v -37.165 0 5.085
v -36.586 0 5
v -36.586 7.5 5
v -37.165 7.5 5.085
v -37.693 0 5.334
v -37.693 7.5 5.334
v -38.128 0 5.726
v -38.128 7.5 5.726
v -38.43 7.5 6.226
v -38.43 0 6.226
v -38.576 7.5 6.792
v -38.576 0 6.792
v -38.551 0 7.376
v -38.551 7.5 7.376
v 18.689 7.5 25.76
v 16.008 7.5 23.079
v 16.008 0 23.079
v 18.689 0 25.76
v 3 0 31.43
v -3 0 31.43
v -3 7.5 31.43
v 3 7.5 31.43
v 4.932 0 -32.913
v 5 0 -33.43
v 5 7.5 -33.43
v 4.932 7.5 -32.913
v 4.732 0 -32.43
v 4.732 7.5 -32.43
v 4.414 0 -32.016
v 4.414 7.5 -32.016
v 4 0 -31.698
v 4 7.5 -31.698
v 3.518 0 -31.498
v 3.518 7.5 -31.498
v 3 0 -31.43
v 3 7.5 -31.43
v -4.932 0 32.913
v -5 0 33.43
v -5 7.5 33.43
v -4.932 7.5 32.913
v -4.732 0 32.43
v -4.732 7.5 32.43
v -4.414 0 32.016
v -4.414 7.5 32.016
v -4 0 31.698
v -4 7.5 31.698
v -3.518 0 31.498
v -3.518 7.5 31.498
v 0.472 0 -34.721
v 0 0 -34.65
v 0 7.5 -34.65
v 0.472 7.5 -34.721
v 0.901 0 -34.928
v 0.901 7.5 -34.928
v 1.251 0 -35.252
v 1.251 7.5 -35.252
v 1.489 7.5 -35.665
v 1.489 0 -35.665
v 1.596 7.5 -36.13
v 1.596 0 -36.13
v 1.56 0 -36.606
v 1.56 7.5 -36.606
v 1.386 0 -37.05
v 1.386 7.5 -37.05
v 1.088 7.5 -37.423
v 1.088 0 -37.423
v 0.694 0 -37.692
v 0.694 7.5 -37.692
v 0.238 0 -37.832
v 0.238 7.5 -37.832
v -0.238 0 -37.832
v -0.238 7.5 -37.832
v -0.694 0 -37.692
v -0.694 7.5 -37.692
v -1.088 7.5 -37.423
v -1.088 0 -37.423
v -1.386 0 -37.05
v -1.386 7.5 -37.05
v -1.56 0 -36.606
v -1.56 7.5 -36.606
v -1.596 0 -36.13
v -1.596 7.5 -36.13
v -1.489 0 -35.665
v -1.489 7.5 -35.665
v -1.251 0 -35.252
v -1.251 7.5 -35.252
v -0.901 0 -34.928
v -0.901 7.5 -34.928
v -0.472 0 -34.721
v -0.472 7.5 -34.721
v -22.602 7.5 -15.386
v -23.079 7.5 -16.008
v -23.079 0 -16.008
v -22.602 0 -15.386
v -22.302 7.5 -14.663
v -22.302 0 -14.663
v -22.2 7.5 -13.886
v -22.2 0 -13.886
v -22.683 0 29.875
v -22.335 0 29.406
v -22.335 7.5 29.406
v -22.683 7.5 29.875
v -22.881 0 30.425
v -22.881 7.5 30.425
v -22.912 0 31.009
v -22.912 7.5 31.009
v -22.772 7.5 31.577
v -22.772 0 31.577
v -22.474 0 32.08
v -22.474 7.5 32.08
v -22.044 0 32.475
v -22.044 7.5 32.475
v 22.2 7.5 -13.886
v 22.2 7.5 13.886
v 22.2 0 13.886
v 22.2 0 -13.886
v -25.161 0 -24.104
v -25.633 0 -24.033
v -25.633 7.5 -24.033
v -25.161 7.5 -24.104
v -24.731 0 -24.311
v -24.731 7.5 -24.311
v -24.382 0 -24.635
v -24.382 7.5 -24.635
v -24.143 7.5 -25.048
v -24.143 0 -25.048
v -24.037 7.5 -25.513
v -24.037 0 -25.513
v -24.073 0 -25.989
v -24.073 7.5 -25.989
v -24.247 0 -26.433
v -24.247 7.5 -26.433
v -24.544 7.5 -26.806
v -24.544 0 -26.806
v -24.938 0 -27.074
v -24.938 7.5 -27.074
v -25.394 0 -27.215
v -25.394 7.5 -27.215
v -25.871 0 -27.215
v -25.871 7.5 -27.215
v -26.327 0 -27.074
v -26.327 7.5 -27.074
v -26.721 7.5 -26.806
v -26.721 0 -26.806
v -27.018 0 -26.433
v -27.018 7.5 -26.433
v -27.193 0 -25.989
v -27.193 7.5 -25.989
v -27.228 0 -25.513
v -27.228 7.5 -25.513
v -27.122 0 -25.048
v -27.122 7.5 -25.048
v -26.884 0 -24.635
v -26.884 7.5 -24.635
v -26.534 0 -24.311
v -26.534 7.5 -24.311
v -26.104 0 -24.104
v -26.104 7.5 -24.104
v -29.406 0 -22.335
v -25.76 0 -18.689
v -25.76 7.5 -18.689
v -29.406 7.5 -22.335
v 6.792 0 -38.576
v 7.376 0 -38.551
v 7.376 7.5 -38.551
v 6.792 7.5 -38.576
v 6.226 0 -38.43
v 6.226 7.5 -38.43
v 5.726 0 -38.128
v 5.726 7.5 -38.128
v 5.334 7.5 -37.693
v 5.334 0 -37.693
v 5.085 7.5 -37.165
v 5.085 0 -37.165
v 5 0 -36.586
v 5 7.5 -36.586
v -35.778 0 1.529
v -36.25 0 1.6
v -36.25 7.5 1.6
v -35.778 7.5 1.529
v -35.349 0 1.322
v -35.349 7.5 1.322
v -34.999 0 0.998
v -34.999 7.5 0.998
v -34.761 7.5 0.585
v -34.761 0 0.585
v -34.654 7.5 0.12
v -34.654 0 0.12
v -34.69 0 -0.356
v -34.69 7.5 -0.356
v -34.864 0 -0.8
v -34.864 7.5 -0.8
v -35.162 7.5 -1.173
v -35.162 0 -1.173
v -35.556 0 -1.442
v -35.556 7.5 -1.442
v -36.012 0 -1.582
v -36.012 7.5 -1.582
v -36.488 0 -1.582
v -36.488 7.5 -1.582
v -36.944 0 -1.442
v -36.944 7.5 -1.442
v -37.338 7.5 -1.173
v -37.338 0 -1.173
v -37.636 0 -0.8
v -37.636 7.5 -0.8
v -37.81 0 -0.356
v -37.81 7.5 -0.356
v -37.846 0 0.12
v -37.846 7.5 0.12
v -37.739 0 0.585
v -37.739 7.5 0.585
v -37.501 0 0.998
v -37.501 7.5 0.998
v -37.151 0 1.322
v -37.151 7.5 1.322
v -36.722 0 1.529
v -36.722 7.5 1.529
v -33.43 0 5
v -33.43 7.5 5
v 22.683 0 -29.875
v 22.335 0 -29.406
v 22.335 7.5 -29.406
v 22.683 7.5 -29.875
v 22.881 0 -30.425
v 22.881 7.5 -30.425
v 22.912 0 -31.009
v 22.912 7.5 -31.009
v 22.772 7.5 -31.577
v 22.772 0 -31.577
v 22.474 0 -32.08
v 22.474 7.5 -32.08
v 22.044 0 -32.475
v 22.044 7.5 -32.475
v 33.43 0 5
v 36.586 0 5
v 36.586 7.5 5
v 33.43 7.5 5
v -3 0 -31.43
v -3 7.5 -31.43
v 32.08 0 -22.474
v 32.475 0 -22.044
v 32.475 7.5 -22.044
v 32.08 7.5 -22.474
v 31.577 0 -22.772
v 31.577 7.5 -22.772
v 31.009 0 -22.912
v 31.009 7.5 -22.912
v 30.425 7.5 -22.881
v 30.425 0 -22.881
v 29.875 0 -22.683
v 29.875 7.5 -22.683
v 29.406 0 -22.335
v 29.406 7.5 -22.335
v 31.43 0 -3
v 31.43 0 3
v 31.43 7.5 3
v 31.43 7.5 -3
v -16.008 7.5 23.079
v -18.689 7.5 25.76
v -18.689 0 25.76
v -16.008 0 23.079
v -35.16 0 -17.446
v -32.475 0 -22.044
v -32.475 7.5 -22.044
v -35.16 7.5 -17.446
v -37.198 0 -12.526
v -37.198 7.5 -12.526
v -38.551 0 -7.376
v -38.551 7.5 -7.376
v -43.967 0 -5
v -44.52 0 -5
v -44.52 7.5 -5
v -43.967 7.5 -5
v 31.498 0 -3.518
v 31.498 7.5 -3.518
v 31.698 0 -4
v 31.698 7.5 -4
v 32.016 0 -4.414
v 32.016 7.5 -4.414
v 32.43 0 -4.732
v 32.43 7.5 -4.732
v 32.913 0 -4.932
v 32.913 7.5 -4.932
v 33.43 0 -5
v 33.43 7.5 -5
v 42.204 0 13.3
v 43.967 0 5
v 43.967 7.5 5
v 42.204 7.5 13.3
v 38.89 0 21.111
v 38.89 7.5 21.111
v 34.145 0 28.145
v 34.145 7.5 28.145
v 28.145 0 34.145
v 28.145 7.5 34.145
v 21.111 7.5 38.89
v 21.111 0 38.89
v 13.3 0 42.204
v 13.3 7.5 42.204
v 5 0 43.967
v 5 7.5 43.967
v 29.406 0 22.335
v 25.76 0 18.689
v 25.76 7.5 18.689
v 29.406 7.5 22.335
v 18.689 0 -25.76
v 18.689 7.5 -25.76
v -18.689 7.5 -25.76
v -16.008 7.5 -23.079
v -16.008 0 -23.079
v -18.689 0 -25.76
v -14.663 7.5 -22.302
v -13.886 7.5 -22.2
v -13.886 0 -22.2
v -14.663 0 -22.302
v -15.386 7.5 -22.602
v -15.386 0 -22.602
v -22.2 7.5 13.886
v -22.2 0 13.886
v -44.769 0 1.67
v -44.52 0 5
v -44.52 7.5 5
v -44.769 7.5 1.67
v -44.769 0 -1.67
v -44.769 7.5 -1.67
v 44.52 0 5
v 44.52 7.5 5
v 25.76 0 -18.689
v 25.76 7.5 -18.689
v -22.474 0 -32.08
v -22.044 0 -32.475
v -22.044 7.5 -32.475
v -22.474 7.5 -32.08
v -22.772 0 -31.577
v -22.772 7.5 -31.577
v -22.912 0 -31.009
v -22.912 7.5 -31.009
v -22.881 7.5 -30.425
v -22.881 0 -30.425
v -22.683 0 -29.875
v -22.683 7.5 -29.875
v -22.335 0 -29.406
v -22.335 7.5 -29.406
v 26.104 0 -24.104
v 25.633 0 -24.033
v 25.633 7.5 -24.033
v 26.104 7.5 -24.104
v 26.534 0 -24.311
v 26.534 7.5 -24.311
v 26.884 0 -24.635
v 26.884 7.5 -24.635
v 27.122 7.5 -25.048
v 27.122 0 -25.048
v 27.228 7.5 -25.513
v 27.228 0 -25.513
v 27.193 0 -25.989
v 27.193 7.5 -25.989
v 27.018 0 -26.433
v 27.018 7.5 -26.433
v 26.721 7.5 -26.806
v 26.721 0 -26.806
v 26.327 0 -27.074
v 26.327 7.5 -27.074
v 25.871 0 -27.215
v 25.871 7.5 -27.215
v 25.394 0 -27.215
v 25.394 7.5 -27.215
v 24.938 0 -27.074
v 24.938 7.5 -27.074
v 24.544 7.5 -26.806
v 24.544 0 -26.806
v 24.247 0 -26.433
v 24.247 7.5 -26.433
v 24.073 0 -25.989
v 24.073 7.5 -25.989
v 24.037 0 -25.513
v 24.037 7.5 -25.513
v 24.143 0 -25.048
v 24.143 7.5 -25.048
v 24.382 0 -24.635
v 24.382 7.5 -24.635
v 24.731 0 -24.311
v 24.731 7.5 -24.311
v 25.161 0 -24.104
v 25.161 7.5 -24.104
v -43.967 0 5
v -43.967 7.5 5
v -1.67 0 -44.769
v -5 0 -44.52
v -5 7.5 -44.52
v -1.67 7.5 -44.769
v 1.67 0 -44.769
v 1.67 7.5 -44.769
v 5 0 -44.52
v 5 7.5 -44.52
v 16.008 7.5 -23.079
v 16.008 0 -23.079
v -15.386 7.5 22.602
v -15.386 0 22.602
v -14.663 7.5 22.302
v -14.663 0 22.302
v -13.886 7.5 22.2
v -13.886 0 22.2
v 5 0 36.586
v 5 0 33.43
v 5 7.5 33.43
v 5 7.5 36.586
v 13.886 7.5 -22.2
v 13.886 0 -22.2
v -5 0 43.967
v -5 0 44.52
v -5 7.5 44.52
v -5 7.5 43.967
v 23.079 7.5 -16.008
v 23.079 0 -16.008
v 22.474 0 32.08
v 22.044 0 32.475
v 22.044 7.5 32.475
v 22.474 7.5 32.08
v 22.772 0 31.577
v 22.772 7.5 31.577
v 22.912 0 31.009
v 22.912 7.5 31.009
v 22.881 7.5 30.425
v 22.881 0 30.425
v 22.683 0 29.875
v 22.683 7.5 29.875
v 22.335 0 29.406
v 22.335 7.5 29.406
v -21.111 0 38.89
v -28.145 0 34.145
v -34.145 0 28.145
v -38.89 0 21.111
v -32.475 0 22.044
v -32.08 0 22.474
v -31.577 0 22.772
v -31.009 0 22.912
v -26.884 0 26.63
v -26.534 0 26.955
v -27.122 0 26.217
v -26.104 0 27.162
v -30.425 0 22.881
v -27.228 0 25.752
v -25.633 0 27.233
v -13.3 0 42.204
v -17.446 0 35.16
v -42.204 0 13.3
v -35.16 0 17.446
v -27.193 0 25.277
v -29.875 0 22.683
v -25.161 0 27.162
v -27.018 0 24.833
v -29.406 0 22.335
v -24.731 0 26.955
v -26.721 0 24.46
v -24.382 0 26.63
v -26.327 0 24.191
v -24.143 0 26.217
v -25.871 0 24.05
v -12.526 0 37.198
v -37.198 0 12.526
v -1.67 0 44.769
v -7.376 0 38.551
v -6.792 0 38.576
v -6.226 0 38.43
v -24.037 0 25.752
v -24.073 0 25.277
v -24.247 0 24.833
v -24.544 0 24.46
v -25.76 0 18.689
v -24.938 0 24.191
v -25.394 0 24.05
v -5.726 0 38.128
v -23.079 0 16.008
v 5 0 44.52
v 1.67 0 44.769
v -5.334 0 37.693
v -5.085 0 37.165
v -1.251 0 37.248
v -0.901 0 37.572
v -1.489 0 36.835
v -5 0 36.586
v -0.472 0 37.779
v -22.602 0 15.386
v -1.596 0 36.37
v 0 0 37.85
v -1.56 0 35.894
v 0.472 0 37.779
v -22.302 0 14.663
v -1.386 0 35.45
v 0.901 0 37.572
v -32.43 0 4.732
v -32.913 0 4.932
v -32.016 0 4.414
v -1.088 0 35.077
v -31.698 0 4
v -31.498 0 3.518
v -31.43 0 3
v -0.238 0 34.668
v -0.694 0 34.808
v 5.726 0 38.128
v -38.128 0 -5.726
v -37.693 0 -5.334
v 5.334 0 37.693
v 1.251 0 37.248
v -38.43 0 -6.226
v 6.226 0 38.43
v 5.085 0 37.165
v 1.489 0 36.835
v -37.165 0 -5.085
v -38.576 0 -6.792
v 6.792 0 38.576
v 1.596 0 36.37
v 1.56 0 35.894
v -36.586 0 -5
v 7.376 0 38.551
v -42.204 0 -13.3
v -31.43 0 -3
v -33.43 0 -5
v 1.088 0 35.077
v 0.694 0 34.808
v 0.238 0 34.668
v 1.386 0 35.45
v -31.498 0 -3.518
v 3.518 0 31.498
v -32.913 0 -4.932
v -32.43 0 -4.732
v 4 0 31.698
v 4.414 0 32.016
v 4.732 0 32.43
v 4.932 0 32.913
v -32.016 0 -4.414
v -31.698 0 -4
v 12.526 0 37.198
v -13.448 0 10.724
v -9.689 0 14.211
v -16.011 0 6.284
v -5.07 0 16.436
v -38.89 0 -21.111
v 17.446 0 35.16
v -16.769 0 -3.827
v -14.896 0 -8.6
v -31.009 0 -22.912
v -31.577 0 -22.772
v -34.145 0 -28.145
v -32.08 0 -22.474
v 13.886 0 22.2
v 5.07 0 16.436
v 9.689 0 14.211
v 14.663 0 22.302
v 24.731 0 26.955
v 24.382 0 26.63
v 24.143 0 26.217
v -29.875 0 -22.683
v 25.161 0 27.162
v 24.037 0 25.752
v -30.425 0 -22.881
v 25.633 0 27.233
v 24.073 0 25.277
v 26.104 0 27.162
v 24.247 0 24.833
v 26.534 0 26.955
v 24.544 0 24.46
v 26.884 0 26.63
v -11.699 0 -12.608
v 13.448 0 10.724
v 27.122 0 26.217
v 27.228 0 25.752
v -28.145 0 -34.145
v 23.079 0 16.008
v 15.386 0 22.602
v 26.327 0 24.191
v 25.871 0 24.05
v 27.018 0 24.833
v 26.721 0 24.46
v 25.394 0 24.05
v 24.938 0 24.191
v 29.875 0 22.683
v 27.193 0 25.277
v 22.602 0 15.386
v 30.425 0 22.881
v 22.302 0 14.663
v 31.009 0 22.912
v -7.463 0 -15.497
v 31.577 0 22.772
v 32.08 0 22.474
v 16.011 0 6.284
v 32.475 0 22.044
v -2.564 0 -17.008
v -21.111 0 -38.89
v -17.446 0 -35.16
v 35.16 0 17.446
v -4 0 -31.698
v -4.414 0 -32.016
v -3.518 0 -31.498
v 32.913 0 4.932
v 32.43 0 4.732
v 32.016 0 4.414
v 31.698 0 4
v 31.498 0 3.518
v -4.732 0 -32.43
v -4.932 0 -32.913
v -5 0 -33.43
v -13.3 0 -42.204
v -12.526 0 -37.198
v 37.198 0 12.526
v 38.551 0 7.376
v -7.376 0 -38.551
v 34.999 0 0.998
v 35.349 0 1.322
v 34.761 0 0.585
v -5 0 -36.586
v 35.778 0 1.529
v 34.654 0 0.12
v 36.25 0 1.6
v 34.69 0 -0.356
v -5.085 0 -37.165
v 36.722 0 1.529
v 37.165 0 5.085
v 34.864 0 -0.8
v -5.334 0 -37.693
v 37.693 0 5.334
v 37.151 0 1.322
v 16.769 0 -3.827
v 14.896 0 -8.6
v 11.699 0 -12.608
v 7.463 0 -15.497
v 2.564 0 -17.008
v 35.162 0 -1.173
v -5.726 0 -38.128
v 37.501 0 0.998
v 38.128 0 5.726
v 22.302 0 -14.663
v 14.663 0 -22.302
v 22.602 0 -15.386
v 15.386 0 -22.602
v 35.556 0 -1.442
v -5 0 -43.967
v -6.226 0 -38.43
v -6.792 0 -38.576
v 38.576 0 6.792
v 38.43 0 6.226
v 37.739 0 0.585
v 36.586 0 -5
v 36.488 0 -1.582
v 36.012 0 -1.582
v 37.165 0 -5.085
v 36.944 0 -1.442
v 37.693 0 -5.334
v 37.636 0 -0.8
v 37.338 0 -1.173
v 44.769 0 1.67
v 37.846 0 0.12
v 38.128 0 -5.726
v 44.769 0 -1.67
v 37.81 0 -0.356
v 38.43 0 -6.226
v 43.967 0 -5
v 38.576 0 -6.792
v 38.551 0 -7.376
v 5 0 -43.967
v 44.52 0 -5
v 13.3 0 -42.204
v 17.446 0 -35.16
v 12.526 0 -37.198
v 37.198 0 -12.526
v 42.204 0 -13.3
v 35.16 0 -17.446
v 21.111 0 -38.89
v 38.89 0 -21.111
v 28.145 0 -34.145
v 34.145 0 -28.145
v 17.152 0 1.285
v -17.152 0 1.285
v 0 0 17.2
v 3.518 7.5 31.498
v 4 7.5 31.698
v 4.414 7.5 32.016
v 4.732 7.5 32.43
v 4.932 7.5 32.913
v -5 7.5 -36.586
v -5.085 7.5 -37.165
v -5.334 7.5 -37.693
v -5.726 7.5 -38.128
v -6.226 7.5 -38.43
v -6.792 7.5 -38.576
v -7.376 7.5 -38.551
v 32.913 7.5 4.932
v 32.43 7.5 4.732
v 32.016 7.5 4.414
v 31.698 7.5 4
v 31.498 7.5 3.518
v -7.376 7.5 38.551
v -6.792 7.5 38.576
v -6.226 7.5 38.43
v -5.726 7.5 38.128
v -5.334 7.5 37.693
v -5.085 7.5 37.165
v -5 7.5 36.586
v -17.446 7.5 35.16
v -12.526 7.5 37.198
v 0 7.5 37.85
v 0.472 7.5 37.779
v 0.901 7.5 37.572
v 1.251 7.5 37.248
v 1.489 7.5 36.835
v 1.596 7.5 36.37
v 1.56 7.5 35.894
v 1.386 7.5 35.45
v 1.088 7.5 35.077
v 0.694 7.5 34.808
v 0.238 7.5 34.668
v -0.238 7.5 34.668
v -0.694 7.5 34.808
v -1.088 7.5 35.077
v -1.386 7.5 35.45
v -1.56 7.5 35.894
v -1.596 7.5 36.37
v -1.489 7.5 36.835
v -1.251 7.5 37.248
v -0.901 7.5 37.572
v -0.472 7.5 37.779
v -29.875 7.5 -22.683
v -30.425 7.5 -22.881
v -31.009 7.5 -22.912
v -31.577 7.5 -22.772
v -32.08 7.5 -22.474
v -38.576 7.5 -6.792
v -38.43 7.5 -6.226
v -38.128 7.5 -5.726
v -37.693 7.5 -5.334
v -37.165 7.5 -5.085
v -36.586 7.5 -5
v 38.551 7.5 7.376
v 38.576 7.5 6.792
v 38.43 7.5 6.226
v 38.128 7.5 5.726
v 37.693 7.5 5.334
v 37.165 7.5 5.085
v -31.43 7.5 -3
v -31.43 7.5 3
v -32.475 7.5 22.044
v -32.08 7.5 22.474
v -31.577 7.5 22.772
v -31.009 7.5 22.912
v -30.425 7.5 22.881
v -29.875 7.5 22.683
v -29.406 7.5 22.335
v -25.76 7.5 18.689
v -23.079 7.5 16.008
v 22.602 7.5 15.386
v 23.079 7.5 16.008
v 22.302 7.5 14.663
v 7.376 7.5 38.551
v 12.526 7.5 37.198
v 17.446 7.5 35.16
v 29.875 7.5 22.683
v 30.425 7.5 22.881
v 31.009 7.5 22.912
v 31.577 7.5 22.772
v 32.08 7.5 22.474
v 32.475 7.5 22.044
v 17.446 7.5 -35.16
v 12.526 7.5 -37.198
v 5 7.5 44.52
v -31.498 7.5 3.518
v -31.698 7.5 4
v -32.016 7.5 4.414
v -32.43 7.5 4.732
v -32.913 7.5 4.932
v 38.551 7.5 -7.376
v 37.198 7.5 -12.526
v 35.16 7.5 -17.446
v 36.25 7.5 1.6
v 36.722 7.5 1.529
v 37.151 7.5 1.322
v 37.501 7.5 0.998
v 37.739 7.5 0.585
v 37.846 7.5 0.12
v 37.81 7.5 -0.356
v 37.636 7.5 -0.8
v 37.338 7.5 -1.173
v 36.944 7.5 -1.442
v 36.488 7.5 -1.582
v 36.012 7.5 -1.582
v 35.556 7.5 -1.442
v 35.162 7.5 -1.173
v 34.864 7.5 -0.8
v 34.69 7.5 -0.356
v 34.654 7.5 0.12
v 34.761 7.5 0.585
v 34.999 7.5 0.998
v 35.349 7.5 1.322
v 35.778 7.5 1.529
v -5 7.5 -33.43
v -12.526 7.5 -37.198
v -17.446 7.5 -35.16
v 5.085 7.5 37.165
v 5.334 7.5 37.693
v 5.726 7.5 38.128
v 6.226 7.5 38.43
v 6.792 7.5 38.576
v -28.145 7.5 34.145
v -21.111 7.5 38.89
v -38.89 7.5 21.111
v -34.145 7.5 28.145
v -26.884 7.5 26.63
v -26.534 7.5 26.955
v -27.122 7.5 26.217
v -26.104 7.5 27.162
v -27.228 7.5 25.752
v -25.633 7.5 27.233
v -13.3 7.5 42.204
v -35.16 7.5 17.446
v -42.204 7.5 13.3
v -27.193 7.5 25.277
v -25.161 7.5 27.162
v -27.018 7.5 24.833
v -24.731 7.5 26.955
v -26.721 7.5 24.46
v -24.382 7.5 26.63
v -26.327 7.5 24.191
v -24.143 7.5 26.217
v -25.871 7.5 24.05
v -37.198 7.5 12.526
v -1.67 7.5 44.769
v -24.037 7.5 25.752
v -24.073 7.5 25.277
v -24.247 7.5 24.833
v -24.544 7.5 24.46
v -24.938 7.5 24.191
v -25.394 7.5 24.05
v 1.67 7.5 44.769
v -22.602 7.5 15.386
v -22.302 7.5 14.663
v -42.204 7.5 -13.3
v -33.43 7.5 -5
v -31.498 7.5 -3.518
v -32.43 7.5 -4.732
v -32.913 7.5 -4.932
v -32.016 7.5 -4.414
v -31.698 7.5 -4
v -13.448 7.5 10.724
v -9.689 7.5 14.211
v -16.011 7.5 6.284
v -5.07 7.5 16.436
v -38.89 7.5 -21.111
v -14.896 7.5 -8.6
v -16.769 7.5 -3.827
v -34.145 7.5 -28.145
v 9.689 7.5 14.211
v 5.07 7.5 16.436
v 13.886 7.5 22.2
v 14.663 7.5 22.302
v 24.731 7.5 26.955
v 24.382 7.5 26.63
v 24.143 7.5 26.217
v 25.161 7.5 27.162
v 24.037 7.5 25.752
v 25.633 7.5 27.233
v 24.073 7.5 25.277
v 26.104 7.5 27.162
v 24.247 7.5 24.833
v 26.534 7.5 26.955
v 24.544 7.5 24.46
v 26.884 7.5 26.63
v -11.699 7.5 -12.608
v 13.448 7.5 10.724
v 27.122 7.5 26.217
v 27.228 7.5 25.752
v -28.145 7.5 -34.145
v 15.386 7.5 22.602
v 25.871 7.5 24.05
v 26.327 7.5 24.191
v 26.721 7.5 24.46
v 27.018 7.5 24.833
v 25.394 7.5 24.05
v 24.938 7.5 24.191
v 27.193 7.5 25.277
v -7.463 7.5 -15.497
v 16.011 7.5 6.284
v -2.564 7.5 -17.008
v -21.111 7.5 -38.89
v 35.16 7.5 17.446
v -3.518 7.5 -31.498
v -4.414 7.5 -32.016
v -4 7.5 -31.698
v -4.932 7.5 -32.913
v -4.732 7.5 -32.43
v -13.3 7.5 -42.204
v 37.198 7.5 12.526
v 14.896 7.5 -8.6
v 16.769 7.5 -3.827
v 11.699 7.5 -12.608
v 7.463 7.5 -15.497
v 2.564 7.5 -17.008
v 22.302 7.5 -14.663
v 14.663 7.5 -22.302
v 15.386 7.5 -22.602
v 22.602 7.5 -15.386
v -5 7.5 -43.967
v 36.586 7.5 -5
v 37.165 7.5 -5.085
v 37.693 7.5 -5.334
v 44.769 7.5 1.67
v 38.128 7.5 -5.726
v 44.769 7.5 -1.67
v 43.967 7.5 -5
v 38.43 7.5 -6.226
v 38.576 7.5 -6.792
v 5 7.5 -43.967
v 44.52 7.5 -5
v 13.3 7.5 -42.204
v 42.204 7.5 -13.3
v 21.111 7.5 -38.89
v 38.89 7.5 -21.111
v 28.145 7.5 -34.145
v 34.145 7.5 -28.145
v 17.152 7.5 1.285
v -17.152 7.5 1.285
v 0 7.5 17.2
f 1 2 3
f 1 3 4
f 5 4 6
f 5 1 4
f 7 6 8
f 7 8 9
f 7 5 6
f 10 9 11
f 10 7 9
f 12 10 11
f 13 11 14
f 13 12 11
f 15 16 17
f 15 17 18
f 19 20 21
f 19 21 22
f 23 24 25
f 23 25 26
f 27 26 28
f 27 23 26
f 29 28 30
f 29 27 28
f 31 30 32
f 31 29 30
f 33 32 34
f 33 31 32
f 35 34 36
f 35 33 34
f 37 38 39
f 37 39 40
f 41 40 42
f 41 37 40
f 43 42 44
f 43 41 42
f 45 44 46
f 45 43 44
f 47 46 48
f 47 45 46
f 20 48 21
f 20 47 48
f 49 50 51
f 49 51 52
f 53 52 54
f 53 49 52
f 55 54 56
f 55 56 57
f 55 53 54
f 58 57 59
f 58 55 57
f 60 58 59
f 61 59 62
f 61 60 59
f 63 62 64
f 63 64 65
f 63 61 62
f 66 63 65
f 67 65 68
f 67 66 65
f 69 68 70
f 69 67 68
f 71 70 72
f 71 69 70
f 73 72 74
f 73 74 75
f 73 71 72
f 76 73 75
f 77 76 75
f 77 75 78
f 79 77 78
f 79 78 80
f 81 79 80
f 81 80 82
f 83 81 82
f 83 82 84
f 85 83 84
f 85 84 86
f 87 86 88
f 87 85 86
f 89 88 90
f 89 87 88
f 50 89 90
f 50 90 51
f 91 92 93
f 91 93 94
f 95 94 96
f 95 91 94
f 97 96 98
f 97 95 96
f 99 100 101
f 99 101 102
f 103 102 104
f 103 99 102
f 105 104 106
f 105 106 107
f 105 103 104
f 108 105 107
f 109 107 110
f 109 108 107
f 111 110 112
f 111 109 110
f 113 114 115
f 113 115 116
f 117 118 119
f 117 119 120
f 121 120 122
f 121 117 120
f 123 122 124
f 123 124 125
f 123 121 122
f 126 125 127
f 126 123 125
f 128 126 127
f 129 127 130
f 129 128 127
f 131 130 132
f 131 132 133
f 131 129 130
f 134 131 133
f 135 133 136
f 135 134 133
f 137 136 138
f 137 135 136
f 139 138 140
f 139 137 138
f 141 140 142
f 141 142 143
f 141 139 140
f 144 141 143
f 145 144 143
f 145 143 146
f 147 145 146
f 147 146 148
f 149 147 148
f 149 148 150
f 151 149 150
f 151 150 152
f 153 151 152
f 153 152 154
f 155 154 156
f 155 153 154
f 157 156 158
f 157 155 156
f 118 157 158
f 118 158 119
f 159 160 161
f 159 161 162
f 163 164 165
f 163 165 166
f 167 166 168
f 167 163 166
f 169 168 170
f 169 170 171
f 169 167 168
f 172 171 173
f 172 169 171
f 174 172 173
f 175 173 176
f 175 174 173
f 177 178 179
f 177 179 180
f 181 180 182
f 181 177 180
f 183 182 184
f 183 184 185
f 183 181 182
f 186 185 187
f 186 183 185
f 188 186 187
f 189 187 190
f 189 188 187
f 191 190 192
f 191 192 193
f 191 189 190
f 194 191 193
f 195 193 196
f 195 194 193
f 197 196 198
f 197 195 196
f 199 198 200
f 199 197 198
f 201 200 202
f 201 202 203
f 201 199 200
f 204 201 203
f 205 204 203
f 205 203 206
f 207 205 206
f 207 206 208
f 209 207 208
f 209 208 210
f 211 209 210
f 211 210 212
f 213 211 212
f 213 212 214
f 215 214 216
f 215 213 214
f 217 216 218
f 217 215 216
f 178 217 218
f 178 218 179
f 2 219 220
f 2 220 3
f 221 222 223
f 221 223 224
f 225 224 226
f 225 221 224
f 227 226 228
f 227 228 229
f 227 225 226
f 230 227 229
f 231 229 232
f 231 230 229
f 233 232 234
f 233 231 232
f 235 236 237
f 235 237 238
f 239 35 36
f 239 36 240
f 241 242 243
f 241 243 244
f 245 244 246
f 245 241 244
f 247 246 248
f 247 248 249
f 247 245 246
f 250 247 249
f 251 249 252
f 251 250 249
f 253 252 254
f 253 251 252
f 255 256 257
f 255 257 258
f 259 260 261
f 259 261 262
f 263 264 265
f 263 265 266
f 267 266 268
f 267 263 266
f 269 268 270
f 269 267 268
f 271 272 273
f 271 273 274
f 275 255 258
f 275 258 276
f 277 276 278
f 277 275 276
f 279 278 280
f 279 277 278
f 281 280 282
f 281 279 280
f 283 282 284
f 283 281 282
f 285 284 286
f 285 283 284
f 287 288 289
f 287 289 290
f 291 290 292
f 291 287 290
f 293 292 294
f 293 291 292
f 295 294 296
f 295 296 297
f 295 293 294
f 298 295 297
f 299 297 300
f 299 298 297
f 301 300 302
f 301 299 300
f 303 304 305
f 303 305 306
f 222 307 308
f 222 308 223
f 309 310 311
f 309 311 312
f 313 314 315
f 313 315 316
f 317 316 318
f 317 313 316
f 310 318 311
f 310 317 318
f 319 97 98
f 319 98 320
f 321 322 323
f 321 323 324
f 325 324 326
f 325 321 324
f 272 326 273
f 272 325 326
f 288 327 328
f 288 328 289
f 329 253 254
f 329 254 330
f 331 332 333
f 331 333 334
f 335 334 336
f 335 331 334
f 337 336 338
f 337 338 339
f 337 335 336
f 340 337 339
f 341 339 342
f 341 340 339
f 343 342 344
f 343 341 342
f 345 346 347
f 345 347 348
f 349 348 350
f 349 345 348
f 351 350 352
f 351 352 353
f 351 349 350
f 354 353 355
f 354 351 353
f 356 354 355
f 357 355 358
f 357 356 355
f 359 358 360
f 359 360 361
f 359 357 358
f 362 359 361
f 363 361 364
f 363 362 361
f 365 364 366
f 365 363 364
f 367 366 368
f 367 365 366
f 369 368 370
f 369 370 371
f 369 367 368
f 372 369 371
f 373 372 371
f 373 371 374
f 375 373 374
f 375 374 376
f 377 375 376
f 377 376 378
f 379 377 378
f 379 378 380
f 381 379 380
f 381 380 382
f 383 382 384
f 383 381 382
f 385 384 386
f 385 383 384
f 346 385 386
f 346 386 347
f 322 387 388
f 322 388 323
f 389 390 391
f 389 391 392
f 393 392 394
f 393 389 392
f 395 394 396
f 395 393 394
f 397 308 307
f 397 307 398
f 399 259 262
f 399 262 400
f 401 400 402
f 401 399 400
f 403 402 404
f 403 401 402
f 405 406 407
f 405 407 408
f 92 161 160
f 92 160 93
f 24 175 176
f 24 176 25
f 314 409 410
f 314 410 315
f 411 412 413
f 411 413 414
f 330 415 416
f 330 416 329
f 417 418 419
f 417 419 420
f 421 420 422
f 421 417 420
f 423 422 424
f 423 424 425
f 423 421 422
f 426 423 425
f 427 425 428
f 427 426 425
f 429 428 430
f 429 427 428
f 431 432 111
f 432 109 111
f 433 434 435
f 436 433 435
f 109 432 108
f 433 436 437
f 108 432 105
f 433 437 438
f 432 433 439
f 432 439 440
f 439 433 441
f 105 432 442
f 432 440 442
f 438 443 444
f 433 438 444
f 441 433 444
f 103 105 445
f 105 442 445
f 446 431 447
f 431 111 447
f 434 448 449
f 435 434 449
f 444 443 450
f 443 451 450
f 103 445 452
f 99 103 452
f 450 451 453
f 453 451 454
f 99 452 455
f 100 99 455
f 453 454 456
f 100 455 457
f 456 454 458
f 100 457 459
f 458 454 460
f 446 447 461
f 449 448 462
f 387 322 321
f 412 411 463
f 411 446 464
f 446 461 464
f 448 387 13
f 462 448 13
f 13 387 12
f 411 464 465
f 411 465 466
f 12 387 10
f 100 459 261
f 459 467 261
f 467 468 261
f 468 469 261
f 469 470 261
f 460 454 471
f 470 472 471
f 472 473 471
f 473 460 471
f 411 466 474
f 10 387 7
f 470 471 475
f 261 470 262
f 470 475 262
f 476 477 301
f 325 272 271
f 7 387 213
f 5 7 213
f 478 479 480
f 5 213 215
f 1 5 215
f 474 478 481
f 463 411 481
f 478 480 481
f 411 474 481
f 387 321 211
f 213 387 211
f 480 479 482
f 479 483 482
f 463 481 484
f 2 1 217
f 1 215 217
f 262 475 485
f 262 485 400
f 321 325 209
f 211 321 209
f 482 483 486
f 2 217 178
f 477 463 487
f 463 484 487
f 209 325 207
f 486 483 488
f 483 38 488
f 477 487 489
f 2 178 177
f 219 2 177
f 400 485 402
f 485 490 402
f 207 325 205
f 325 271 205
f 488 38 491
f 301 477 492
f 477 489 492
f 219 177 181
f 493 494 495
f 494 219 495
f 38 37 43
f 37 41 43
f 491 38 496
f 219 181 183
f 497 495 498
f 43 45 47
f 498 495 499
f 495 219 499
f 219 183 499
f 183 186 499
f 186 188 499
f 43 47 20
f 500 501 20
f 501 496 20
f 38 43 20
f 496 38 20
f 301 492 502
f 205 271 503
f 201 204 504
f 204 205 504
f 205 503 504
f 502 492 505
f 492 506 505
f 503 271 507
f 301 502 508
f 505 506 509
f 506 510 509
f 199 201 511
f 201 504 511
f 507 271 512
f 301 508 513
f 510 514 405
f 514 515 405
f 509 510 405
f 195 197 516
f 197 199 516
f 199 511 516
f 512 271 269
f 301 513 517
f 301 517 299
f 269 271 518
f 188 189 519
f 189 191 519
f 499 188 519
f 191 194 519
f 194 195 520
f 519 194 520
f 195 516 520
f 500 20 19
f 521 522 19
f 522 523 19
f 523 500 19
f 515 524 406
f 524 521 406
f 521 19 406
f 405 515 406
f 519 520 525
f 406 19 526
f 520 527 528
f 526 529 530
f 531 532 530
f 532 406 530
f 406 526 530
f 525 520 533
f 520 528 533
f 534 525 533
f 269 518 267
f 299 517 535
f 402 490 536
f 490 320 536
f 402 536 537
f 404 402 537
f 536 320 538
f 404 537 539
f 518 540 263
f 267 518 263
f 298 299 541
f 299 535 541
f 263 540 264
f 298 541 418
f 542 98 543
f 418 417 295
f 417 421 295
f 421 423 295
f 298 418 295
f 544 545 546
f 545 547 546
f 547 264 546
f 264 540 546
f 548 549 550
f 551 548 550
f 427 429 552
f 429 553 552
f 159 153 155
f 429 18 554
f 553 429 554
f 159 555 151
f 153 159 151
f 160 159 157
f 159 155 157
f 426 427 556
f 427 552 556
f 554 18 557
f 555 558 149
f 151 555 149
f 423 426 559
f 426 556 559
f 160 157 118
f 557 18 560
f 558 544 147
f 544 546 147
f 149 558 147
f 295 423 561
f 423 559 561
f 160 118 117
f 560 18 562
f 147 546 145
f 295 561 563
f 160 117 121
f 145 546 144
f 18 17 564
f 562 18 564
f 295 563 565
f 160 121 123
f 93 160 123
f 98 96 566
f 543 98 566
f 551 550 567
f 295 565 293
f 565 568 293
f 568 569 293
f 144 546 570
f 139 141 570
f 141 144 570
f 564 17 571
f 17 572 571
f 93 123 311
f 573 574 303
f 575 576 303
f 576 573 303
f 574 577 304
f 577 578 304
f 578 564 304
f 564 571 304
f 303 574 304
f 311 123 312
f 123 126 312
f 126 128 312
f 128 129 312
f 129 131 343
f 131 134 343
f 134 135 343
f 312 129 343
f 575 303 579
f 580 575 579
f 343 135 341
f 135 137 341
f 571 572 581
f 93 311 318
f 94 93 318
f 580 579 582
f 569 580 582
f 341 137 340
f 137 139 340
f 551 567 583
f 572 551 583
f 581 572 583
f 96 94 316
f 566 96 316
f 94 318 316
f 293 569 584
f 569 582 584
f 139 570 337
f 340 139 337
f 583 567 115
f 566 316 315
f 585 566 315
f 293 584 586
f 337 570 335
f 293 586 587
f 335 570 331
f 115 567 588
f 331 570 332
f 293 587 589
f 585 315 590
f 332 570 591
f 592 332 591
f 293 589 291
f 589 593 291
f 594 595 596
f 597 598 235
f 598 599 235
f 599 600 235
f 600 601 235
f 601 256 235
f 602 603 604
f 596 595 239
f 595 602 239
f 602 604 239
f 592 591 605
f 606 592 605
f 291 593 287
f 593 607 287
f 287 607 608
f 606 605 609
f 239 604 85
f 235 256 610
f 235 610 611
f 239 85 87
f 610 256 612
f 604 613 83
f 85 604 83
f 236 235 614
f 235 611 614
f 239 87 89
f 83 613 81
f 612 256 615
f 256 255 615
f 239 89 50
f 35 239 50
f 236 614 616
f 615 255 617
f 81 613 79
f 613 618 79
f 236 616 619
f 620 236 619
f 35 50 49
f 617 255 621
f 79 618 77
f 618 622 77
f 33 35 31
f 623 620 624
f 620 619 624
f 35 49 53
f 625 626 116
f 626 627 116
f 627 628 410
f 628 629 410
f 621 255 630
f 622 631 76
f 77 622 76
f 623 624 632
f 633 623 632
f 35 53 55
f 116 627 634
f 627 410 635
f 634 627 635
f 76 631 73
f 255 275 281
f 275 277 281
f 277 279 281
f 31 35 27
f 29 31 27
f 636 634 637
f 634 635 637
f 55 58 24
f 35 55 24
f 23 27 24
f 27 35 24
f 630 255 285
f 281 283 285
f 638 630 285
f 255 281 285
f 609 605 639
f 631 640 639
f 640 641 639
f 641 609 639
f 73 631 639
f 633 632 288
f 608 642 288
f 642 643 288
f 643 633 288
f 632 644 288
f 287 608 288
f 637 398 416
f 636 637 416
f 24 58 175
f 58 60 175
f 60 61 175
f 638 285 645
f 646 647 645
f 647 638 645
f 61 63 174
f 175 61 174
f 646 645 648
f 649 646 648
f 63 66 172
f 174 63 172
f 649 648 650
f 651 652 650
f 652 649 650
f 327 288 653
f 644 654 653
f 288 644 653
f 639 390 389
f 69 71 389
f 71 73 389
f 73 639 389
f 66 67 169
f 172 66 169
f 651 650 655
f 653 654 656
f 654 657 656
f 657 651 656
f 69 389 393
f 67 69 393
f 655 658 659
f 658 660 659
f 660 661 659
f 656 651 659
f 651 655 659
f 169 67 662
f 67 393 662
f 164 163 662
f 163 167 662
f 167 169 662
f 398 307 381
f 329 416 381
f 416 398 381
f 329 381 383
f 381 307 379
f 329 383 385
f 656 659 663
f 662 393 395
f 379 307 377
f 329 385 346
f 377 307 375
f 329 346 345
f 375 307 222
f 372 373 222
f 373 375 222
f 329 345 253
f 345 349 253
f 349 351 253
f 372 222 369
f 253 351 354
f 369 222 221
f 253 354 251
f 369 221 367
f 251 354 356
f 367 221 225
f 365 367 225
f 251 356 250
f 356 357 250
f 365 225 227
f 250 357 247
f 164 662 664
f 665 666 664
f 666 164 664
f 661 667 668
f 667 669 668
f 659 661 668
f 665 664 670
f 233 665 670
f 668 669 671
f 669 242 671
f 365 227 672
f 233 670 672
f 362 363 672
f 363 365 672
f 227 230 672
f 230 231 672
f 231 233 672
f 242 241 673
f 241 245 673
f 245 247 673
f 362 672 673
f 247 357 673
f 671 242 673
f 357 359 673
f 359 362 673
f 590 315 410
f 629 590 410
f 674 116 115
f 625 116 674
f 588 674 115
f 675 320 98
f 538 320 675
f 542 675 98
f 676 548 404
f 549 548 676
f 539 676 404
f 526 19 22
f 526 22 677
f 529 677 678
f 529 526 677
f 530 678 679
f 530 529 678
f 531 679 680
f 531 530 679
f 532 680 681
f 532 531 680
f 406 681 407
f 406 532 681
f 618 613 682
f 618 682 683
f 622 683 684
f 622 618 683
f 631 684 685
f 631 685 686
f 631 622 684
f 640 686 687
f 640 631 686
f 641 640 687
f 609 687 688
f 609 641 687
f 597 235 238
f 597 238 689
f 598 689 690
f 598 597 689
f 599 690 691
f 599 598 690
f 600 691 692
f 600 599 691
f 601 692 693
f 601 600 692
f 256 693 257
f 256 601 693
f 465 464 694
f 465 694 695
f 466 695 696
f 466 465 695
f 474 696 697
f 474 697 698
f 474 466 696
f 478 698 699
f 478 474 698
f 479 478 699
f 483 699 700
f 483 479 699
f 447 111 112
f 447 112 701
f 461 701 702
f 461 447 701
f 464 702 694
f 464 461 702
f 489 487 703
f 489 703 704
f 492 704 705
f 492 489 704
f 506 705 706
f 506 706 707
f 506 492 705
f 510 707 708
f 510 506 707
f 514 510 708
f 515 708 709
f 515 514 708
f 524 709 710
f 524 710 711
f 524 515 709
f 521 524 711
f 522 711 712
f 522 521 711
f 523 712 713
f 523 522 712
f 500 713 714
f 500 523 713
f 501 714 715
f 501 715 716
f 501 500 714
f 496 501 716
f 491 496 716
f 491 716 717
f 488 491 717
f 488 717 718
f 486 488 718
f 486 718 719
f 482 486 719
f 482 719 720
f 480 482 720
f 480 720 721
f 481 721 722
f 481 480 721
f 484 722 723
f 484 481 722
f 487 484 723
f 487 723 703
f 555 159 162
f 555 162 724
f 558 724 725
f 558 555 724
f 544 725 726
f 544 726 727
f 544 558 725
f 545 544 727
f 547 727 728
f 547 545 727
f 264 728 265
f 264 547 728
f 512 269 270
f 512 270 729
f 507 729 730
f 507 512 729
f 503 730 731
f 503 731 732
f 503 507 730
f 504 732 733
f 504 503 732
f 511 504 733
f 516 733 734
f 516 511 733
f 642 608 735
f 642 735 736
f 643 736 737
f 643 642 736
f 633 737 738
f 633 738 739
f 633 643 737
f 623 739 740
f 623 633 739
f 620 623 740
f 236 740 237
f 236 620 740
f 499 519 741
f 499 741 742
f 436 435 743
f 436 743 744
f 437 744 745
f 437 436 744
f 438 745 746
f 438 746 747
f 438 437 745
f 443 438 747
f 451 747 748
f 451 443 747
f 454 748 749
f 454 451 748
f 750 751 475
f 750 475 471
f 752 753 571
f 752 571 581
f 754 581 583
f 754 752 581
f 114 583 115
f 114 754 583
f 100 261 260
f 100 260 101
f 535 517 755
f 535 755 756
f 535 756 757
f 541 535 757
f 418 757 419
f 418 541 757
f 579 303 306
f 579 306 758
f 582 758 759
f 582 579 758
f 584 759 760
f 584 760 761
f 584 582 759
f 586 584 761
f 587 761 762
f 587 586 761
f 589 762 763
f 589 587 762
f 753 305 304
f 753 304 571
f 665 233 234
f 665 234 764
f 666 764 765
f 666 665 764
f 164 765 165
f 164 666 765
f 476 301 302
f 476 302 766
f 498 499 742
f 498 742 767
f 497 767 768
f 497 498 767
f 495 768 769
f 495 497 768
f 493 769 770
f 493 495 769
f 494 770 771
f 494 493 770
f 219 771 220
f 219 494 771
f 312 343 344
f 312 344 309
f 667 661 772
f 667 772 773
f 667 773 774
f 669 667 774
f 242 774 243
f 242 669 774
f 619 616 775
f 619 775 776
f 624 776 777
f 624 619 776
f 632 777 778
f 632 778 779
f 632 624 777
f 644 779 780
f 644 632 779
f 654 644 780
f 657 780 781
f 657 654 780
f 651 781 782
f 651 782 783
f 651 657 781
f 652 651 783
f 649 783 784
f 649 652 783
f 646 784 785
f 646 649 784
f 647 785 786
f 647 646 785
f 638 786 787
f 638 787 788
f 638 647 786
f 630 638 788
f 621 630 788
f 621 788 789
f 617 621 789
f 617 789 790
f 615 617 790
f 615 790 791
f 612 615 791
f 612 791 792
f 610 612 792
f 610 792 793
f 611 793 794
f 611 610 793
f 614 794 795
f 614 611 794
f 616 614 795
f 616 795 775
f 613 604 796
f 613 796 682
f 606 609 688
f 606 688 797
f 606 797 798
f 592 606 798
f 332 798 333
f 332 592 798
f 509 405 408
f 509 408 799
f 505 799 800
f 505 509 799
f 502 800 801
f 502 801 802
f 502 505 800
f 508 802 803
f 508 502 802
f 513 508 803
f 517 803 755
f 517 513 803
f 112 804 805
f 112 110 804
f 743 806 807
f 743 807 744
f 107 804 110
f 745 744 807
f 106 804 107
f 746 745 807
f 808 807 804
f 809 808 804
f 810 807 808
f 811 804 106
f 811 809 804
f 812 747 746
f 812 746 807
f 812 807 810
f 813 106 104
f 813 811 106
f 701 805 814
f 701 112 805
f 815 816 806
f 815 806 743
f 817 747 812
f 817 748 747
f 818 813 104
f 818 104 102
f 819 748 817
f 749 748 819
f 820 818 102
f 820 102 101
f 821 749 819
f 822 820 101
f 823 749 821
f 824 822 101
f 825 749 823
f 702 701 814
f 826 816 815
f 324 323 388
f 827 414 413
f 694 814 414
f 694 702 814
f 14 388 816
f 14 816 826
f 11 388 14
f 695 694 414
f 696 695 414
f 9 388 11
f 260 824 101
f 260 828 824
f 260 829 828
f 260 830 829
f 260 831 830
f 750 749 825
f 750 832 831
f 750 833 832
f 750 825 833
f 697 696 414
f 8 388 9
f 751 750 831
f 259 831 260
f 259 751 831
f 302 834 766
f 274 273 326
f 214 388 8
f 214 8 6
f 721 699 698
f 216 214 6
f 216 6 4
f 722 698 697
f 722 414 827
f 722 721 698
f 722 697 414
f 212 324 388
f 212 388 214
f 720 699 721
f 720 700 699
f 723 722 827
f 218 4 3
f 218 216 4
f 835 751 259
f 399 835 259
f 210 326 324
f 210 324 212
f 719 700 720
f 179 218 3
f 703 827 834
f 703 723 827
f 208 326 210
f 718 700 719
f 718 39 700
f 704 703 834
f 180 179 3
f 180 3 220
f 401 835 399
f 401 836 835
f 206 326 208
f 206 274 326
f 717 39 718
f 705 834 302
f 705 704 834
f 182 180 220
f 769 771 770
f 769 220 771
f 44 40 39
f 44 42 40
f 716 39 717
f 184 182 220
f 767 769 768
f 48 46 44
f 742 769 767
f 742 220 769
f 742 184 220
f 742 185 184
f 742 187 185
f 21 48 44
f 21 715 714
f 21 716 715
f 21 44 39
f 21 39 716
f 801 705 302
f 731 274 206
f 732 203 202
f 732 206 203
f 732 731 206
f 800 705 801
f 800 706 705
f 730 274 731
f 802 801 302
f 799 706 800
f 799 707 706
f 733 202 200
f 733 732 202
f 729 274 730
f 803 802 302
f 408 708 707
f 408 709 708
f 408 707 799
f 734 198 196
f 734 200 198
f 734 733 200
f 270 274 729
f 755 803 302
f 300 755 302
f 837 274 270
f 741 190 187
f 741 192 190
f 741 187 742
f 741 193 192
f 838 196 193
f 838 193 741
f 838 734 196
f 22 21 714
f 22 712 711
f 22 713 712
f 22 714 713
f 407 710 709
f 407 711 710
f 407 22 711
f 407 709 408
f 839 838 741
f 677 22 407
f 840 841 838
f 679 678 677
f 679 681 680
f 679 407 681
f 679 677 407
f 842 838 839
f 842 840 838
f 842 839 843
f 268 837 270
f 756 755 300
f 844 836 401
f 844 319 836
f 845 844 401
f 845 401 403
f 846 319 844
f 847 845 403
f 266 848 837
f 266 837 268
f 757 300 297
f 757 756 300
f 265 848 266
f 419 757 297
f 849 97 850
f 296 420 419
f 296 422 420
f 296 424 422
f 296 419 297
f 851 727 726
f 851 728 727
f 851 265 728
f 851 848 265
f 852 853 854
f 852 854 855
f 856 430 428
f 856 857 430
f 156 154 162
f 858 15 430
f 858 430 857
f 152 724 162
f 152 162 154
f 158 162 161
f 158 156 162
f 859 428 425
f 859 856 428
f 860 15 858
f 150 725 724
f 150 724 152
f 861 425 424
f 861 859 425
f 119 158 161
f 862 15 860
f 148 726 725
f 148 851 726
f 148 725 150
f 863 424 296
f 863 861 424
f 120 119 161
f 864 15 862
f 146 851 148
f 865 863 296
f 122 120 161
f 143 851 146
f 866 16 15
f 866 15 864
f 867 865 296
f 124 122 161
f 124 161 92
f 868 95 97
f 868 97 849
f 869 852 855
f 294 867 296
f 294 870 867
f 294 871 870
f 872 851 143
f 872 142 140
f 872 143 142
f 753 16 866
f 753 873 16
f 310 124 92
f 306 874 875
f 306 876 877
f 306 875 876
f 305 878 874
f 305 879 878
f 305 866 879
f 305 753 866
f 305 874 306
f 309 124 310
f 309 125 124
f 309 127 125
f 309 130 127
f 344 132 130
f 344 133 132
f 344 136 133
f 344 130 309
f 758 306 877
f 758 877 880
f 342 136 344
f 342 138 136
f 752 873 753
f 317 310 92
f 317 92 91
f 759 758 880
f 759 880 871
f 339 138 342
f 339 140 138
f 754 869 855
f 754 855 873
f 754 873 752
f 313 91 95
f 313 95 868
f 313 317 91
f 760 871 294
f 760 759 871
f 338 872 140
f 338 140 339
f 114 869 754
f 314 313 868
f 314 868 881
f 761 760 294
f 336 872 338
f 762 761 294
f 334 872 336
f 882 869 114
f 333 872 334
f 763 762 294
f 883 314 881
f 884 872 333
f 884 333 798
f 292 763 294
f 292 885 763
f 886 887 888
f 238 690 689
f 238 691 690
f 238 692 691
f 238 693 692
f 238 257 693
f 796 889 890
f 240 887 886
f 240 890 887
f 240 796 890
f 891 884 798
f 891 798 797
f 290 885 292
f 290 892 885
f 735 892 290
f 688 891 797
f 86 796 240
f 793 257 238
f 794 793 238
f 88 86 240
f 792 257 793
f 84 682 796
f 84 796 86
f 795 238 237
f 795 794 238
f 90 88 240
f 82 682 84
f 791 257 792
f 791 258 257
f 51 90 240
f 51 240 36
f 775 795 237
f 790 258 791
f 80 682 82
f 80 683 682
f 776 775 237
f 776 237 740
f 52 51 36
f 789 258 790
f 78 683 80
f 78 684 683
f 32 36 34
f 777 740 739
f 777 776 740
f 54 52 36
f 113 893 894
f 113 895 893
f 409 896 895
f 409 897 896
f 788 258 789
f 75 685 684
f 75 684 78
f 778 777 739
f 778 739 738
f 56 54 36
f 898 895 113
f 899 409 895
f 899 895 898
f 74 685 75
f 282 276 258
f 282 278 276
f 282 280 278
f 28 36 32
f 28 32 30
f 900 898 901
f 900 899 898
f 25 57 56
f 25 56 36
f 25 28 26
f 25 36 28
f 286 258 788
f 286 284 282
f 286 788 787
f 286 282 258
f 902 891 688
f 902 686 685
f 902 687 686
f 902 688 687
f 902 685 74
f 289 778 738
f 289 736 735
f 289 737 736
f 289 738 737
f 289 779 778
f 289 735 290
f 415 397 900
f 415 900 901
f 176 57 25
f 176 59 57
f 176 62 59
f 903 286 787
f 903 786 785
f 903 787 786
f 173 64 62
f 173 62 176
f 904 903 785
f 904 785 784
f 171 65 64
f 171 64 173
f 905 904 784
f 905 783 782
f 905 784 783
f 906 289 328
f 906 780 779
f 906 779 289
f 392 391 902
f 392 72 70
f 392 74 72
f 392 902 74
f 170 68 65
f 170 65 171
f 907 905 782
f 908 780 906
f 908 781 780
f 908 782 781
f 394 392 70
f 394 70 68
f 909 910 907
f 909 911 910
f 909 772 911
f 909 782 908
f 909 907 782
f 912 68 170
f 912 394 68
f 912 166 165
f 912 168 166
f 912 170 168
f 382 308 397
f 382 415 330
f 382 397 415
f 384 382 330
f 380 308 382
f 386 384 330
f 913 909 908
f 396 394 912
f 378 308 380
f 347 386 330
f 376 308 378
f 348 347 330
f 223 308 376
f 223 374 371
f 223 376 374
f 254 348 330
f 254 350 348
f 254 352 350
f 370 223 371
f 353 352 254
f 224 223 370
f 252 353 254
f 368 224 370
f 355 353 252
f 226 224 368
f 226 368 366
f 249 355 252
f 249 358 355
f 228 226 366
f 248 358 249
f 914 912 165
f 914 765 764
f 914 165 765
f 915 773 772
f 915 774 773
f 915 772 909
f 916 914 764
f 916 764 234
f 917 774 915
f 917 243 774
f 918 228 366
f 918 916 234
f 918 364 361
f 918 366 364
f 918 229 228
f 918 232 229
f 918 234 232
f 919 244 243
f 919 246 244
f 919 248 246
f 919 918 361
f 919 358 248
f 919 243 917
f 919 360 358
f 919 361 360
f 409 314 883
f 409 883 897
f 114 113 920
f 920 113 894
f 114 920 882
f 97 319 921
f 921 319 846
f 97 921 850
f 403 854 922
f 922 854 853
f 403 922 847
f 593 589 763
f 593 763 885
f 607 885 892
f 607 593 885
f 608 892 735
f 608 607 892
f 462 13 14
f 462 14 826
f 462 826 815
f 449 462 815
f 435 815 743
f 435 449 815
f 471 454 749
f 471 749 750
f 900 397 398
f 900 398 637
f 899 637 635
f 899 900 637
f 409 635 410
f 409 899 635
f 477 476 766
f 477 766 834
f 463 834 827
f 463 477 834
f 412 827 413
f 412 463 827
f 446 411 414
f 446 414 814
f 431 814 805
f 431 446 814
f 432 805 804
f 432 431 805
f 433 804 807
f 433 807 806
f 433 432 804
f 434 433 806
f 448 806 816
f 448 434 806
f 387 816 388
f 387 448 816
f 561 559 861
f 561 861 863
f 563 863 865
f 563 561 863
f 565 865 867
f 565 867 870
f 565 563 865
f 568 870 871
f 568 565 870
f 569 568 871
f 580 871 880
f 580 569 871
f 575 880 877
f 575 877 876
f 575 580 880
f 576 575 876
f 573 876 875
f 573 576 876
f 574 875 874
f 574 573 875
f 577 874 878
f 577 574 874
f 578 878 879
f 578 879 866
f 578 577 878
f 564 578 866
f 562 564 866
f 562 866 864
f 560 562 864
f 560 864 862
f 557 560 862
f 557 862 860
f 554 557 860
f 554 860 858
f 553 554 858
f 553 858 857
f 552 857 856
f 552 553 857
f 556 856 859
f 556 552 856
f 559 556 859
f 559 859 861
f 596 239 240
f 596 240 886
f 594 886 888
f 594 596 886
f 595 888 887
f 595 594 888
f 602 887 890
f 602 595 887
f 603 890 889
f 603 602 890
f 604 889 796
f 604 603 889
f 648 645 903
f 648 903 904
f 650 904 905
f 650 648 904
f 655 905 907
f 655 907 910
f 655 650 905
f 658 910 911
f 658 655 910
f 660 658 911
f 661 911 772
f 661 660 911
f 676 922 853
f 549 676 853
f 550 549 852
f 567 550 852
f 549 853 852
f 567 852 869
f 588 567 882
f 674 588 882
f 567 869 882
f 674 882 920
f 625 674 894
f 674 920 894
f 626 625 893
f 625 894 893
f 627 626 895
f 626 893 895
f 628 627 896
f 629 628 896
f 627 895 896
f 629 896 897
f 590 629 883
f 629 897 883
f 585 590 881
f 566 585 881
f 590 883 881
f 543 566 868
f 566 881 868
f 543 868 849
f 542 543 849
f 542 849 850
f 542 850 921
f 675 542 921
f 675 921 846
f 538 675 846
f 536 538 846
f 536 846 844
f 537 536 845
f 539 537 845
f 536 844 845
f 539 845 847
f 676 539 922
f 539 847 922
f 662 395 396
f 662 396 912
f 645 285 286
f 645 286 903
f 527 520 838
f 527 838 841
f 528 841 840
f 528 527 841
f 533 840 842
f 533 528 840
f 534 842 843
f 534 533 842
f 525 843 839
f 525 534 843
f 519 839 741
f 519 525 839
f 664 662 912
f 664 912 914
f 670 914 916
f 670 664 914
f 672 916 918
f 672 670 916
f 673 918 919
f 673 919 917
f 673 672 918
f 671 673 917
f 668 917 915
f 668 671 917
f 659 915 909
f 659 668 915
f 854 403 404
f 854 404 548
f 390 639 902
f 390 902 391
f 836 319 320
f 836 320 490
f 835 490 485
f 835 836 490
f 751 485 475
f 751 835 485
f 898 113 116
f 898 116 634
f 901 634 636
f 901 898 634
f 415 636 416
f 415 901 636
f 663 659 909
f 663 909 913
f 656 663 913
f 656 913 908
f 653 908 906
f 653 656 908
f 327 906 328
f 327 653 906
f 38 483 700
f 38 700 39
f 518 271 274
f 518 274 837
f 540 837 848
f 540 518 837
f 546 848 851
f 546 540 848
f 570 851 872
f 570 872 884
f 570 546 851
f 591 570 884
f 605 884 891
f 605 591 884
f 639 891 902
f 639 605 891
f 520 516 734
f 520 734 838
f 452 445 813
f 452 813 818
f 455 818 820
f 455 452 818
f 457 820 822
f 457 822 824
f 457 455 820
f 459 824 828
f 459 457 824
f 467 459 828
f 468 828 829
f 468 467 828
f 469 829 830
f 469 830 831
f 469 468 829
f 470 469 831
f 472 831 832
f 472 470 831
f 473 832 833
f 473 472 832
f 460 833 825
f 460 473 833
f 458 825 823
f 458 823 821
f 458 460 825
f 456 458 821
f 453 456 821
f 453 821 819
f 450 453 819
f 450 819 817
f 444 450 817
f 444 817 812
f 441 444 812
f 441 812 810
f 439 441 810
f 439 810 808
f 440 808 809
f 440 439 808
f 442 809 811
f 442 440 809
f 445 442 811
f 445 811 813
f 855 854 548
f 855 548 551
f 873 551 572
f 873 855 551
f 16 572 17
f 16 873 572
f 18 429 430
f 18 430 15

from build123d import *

# Parameters (mm, degrees)
SKETCH1_R           = 1.6
BOSS_EXTRUDE1_DEPTH = 7.5
SKETCH2_R           = 17.2
BOSS_EXTRUDE2_DEPTH = 7.5


with BuildPart() as part:
    # Sketch1 → Boss-Extrude1 (new body)
    with BuildSketch(Plane(origin=(0, 0, 0), x_dir=(1, 0, 0), z_dir=(0, 1, 0))):
        with BuildLine():
            Line((-5, 43.966606646), (-5, 44.520107817))
            ThreePointArc((-5, 44.520107817), (0, 44.8), (5, 44.520107817))
            Line((5, 44.520107817), (5, 43.966606646))
            ThreePointArc((5, 43.966606646), (31.289475068, 31.289475068), (43.966606646, 5))
            Line((43.966606646, 5), (44.520107817, 5))
            ThreePointArc((44.520107817, 5), (44.8, 0), (44.520107817, -5))
            Line((44.520107817, -5), (43.966606646, -5))
            ThreePointArc((43.966606646, -5), (31.289475068, -31.289475068), (5, -43.966606646))
            Line((5, -43.966606646), (5, -44.520107817))
            ThreePointArc((5, -44.520107817), (0, -44.8), (-5, -44.520107817))
            Line((-5, -44.520107817), (-5, -43.966606646))
            ThreePointArc((-5, -43.966606646), (-31.289475068, -31.289475068), (-43.966606646, -5))
            Line((-43.966606646, -5), (-44.520107817, -5))
            ThreePointArc((-44.520107817, -5), (-44.8, 0), (-44.520107817, 5))
            Line((-44.520107817, 5), (-43.966606646, 5))
            ThreePointArc((-43.966606646, 5), (-31.289475068, 31.289475068), (-5, 43.966606646))
        make_face()
        with Locations(Location((36.25, 0, 0), (0, 0, 270))):
            Circle(SKETCH1_R, mode=Mode.SUBTRACT)
        with Locations(Location((25.632620818, -25.632620818, 0), (0, 0, 270))):
            Circle(SKETCH1_R, mode=Mode.SUBTRACT)
        with Locations(Location((0, -36.25, 0), (0, 0, 270))):
            Circle(SKETCH1_R, mode=Mode.SUBTRACT)
        with Locations(Location((-25.632620818, -25.632620818, 0), (0, 0, 270))):
            Circle(SKETCH1_R, mode=Mode.SUBTRACT)
        with Locations(Location((-36.25, 0, 0), (0, 0, 270))):
            Circle(SKETCH1_R, mode=Mode.SUBTRACT)
        with Locations(Location((-25.632620818, 25.632620818, 0), (0, 0, 270))):
            Circle(SKETCH1_R, mode=Mode.SUBTRACT)
        with Locations(Location((0, 36.25, 0), (0, 0, 270))):
            Circle(SKETCH1_R, mode=Mode.SUBTRACT)
        with Locations(Location((25.632620818, 25.632620818, 0), (0, 0, 270))):
            Circle(SKETCH1_R, mode=Mode.SUBTRACT)
        with BuildLine():
            Line((33.430226046, 5), (36.586370413, 5))
            ThreePointArc((36.586370413, 5), (38.127746073, 5.725574218), (38.550739294, 7.375838926))
            ThreePointArc((38.550739294, 7.375838926), (36.262271651, 15.02032472), (32.474994896, 22.043983453))
            ThreePointArc((32.474994896, 22.043983453), (31.008980156, 22.911795444), (29.406004524, 22.334936712))
            Line((29.406004524, 22.334936712), (25.760059877, 18.688992065))
            Line((25.760059877, 18.688992065), (18.688992065, 25.760059877))
            Line((18.688992065, 25.760059877), (22.334936712, 29.406004524))
            ThreePointArc((22.334936712, 29.406004524), (22.911795444, 31.008980156), (22.043983453, 32.474994896))
            ThreePointArc((22.043983453, 32.474994896), (15.02032472, 36.262271651), (7.375838926, 38.550739294))
            ThreePointArc((7.375838926, 38.550739294), (5.725574218, 38.127746073), (5, 36.586370413))
            Line((5, 36.586370413), (5, 33.430226046))
            ThreePointArc((5, 33.430226046), (4.414213562, 32.016012484), (3, 31.430226046))
            Line((3, 31.430226046), (-3, 31.430226046))
            ThreePointArc((-3, 31.430226046), (-4.414213562, 32.016012484), (-5, 33.430226046))
            Line((-5, 33.430226046), (-5, 36.586370413))
            ThreePointArc((-5, 36.586370413), (-5.725574218, 38.127746073), (-7.375838926, 38.550739294))
            ThreePointArc((-7.375838926, 38.550739294), (-15.02032472, 36.262271651), (-22.043983453, 32.474994896))
            ThreePointArc((-22.043983453, 32.474994896), (-22.911795444, 31.008980156), (-22.334936712, 29.406004524))
            Line((-22.334936712, 29.406004524), (-18.688992065, 25.760059877))
            Line((-18.688992065, 25.760059877), (-25.760059877, 18.688992065))
            Line((-25.760059877, 18.688992065), (-29.406004524, 22.334936712))
            ThreePointArc((-29.406004524, 22.334936712), (-31.008980156, 22.911795444), (-32.474994896, 22.043983453))
            ThreePointArc((-32.474994896, 22.043983453), (-36.262271651, 15.02032472), (-38.550739294, 7.375838926))
            ThreePointArc((-38.550739294, 7.375838926), (-38.127746073, 5.725574218), (-36.586370413, 5))
            Line((-36.586370413, 5), (-33.430226046, 5))
            ThreePointArc((-33.430226046, 5), (-32.016012484, 4.414213562), (-31.430226046, 3))
            Line((-31.430226046, 3), (-31.430226046, -3))
            ThreePointArc((-31.430226046, -3), (-32.016012484, -4.414213562), (-33.430226046, -5))
            Line((-33.430226046, -5), (-36.586370413, -5))
            ThreePointArc((-36.586370413, -5), (-38.127746073, -5.725574218), (-38.550739294, -7.375838926))
            ThreePointArc((-38.550739294, -7.375838926), (-36.262271651, -15.02032472), (-32.474994896, -22.043983453))
            ThreePointArc((-32.474994896, -22.043983453), (-31.008980156, -22.911795444), (-29.406004524, -22.334936712))
            Line((-29.406004524, -22.334936712), (-25.760059877, -18.688992065))
            Line((-25.760059877, -18.688992065), (-18.688992065, -25.760059877))
            Line((-18.688992065, -25.760059877), (-22.334936712, -29.406004524))
            ThreePointArc((-22.334936712, -29.406004524), (-22.911795444, -31.008980156), (-22.043983453, -32.474994896))
            ThreePointArc((-22.043983453, -32.474994896), (-15.02032472, -36.262271651), (-7.375838926, -38.550739294))
            ThreePointArc((-7.375838926, -38.550739294), (-5.725574218, -38.127746073), (-5, -36.586370413))
            Line((-5, -36.586370413), (-5, -33.430226046))
            ThreePointArc((-5, -33.430226046), (-4.414213562, -32.016012484), (-3, -31.430226046))
            Line((-3, -31.430226046), (3, -31.430226046))
            ThreePointArc((3, -31.430226046), (4.414213562, -32.016012484), (5, -33.430226046))
            Line((5, -33.430226046), (5, -36.586370413))
            ThreePointArc((5, -36.586370413), (5.725574218, -38.127746073), (7.375838926, -38.550739294))
            ThreePointArc((7.375838926, -38.550739294), (15.02032472, -36.262271651), (22.043983453, -32.474994896))
            ThreePointArc((22.043983453, -32.474994896), (22.911795444, -31.008980156), (22.334936712, -29.406004524))
            Line((22.334936712, -29.406004524), (18.688992065, -25.760059877))
            Line((18.688992065, -25.760059877), (25.760059877, -18.688992065))
            Line((25.760059877, -18.688992065), (29.406004524, -22.334936712))
            ThreePointArc((29.406004524, -22.334936712), (31.008980156, -22.911795444), (32.474994896, -22.043983453))
            ThreePointArc((32.474994896, -22.043983453), (36.262271651, -15.02032472), (38.550739294, -7.375838926))
            ThreePointArc((38.550739294, -7.375838926), (38.127746073, -5.725574218), (36.586370413, -5))
            Line((36.586370413, -5), (33.430226046, -5))
            ThreePointArc((33.430226046, -5), (32.016012484, -4.414213562), (31.430226046, -3))
            Line((31.430226046, -3), (31.430226046, 3))
            ThreePointArc((31.430226046, 3), (32.016012484, 4.414213562), (33.430226046, 5))
        make_face(mode=Mode.SUBTRACT)
    extrude(amount=BOSS_EXTRUDE1_DEPTH)

    # Sketch2 → Boss-Extrude2 (add)
    with BuildSketch(Plane(origin=(0, 7.5, 0), x_dir=(1, 0, 0), z_dir=(0, 1, 0))):
        with BuildLine():
            Line((13.886291501, 22.2), (-13.886291501, 22.2))
            ThreePointArc((-13.886291501, 22.2), (-15.034341798, 22.428361402), (-16.007611845, 23.078679656))
            Line((-16.007611845, 23.078679656), (-18.688992065, 25.760059877))
            Line((-18.688992065, 25.760059877), (-25.760059877, 18.688992065))
            Line((-25.760059877, 18.688992065), (-23.078679656, 16.007611845))
            ThreePointArc((-23.078679656, 16.007611845), (-22.428361402, 15.034341798), (-22.2, 13.886291501))
            Line((-22.2, 13.886291501), (-22.2, -13.886291501))
            ThreePointArc((-22.2, -13.886291501), (-22.428361402, -15.034341798), (-23.078679656, -16.007611845))
            Line((-23.078679656, -16.007611845), (-25.760059877, -18.688992065))
            Line((-25.760059877, -18.688992065), (-18.688992065, -25.760059877))
            Line((-18.688992065, -25.760059877), (-16.007611845, -23.078679656))
            ThreePointArc((-16.007611845, -23.078679656), (-15.034341798, -22.428361402), (-13.886291501, -22.2))
            Line((-13.886291501, -22.2), (13.886291501, -22.2))
            ThreePointArc((13.886291501, -22.2), (15.034341798, -22.428361402), (16.007611845, -23.078679656))
            Line((16.007611845, -23.078679656), (18.688992065, -25.760059877))
            Line((18.688992065, -25.760059877), (25.760059877, -18.688992065))
            Line((25.760059877, -18.688992065), (23.078679656, -16.007611845))
            ThreePointArc((23.078679656, -16.007611845), (22.428361402, -15.034341798), (22.2, -13.886291501))
            Line((22.2, -13.886291501), (22.2, 13.886291501))
            ThreePointArc((22.2, 13.886291501), (22.428361402, 15.034341798), (23.078679656, 16.007611845))
            Line((23.078679656, 16.007611845), (25.760059877, 18.688992065))
            Line((25.760059877, 18.688992065), (18.688992065, 25.760059877))
            Line((18.688992065, 25.760059877), (16.007611845, 23.078679656))
            ThreePointArc((16.007611845, 23.078679656), (15.034341798, 22.428361402), (13.886291501, 22.2))
        make_face()
        with Locations(Location((0, 0, 0), (0, 0, 270))):
            Circle(SKETCH2_R, mode=Mode.SUBTRACT)
    extrude(amount=-BOSS_EXTRUDE2_DEPTH)


solid = part.part
